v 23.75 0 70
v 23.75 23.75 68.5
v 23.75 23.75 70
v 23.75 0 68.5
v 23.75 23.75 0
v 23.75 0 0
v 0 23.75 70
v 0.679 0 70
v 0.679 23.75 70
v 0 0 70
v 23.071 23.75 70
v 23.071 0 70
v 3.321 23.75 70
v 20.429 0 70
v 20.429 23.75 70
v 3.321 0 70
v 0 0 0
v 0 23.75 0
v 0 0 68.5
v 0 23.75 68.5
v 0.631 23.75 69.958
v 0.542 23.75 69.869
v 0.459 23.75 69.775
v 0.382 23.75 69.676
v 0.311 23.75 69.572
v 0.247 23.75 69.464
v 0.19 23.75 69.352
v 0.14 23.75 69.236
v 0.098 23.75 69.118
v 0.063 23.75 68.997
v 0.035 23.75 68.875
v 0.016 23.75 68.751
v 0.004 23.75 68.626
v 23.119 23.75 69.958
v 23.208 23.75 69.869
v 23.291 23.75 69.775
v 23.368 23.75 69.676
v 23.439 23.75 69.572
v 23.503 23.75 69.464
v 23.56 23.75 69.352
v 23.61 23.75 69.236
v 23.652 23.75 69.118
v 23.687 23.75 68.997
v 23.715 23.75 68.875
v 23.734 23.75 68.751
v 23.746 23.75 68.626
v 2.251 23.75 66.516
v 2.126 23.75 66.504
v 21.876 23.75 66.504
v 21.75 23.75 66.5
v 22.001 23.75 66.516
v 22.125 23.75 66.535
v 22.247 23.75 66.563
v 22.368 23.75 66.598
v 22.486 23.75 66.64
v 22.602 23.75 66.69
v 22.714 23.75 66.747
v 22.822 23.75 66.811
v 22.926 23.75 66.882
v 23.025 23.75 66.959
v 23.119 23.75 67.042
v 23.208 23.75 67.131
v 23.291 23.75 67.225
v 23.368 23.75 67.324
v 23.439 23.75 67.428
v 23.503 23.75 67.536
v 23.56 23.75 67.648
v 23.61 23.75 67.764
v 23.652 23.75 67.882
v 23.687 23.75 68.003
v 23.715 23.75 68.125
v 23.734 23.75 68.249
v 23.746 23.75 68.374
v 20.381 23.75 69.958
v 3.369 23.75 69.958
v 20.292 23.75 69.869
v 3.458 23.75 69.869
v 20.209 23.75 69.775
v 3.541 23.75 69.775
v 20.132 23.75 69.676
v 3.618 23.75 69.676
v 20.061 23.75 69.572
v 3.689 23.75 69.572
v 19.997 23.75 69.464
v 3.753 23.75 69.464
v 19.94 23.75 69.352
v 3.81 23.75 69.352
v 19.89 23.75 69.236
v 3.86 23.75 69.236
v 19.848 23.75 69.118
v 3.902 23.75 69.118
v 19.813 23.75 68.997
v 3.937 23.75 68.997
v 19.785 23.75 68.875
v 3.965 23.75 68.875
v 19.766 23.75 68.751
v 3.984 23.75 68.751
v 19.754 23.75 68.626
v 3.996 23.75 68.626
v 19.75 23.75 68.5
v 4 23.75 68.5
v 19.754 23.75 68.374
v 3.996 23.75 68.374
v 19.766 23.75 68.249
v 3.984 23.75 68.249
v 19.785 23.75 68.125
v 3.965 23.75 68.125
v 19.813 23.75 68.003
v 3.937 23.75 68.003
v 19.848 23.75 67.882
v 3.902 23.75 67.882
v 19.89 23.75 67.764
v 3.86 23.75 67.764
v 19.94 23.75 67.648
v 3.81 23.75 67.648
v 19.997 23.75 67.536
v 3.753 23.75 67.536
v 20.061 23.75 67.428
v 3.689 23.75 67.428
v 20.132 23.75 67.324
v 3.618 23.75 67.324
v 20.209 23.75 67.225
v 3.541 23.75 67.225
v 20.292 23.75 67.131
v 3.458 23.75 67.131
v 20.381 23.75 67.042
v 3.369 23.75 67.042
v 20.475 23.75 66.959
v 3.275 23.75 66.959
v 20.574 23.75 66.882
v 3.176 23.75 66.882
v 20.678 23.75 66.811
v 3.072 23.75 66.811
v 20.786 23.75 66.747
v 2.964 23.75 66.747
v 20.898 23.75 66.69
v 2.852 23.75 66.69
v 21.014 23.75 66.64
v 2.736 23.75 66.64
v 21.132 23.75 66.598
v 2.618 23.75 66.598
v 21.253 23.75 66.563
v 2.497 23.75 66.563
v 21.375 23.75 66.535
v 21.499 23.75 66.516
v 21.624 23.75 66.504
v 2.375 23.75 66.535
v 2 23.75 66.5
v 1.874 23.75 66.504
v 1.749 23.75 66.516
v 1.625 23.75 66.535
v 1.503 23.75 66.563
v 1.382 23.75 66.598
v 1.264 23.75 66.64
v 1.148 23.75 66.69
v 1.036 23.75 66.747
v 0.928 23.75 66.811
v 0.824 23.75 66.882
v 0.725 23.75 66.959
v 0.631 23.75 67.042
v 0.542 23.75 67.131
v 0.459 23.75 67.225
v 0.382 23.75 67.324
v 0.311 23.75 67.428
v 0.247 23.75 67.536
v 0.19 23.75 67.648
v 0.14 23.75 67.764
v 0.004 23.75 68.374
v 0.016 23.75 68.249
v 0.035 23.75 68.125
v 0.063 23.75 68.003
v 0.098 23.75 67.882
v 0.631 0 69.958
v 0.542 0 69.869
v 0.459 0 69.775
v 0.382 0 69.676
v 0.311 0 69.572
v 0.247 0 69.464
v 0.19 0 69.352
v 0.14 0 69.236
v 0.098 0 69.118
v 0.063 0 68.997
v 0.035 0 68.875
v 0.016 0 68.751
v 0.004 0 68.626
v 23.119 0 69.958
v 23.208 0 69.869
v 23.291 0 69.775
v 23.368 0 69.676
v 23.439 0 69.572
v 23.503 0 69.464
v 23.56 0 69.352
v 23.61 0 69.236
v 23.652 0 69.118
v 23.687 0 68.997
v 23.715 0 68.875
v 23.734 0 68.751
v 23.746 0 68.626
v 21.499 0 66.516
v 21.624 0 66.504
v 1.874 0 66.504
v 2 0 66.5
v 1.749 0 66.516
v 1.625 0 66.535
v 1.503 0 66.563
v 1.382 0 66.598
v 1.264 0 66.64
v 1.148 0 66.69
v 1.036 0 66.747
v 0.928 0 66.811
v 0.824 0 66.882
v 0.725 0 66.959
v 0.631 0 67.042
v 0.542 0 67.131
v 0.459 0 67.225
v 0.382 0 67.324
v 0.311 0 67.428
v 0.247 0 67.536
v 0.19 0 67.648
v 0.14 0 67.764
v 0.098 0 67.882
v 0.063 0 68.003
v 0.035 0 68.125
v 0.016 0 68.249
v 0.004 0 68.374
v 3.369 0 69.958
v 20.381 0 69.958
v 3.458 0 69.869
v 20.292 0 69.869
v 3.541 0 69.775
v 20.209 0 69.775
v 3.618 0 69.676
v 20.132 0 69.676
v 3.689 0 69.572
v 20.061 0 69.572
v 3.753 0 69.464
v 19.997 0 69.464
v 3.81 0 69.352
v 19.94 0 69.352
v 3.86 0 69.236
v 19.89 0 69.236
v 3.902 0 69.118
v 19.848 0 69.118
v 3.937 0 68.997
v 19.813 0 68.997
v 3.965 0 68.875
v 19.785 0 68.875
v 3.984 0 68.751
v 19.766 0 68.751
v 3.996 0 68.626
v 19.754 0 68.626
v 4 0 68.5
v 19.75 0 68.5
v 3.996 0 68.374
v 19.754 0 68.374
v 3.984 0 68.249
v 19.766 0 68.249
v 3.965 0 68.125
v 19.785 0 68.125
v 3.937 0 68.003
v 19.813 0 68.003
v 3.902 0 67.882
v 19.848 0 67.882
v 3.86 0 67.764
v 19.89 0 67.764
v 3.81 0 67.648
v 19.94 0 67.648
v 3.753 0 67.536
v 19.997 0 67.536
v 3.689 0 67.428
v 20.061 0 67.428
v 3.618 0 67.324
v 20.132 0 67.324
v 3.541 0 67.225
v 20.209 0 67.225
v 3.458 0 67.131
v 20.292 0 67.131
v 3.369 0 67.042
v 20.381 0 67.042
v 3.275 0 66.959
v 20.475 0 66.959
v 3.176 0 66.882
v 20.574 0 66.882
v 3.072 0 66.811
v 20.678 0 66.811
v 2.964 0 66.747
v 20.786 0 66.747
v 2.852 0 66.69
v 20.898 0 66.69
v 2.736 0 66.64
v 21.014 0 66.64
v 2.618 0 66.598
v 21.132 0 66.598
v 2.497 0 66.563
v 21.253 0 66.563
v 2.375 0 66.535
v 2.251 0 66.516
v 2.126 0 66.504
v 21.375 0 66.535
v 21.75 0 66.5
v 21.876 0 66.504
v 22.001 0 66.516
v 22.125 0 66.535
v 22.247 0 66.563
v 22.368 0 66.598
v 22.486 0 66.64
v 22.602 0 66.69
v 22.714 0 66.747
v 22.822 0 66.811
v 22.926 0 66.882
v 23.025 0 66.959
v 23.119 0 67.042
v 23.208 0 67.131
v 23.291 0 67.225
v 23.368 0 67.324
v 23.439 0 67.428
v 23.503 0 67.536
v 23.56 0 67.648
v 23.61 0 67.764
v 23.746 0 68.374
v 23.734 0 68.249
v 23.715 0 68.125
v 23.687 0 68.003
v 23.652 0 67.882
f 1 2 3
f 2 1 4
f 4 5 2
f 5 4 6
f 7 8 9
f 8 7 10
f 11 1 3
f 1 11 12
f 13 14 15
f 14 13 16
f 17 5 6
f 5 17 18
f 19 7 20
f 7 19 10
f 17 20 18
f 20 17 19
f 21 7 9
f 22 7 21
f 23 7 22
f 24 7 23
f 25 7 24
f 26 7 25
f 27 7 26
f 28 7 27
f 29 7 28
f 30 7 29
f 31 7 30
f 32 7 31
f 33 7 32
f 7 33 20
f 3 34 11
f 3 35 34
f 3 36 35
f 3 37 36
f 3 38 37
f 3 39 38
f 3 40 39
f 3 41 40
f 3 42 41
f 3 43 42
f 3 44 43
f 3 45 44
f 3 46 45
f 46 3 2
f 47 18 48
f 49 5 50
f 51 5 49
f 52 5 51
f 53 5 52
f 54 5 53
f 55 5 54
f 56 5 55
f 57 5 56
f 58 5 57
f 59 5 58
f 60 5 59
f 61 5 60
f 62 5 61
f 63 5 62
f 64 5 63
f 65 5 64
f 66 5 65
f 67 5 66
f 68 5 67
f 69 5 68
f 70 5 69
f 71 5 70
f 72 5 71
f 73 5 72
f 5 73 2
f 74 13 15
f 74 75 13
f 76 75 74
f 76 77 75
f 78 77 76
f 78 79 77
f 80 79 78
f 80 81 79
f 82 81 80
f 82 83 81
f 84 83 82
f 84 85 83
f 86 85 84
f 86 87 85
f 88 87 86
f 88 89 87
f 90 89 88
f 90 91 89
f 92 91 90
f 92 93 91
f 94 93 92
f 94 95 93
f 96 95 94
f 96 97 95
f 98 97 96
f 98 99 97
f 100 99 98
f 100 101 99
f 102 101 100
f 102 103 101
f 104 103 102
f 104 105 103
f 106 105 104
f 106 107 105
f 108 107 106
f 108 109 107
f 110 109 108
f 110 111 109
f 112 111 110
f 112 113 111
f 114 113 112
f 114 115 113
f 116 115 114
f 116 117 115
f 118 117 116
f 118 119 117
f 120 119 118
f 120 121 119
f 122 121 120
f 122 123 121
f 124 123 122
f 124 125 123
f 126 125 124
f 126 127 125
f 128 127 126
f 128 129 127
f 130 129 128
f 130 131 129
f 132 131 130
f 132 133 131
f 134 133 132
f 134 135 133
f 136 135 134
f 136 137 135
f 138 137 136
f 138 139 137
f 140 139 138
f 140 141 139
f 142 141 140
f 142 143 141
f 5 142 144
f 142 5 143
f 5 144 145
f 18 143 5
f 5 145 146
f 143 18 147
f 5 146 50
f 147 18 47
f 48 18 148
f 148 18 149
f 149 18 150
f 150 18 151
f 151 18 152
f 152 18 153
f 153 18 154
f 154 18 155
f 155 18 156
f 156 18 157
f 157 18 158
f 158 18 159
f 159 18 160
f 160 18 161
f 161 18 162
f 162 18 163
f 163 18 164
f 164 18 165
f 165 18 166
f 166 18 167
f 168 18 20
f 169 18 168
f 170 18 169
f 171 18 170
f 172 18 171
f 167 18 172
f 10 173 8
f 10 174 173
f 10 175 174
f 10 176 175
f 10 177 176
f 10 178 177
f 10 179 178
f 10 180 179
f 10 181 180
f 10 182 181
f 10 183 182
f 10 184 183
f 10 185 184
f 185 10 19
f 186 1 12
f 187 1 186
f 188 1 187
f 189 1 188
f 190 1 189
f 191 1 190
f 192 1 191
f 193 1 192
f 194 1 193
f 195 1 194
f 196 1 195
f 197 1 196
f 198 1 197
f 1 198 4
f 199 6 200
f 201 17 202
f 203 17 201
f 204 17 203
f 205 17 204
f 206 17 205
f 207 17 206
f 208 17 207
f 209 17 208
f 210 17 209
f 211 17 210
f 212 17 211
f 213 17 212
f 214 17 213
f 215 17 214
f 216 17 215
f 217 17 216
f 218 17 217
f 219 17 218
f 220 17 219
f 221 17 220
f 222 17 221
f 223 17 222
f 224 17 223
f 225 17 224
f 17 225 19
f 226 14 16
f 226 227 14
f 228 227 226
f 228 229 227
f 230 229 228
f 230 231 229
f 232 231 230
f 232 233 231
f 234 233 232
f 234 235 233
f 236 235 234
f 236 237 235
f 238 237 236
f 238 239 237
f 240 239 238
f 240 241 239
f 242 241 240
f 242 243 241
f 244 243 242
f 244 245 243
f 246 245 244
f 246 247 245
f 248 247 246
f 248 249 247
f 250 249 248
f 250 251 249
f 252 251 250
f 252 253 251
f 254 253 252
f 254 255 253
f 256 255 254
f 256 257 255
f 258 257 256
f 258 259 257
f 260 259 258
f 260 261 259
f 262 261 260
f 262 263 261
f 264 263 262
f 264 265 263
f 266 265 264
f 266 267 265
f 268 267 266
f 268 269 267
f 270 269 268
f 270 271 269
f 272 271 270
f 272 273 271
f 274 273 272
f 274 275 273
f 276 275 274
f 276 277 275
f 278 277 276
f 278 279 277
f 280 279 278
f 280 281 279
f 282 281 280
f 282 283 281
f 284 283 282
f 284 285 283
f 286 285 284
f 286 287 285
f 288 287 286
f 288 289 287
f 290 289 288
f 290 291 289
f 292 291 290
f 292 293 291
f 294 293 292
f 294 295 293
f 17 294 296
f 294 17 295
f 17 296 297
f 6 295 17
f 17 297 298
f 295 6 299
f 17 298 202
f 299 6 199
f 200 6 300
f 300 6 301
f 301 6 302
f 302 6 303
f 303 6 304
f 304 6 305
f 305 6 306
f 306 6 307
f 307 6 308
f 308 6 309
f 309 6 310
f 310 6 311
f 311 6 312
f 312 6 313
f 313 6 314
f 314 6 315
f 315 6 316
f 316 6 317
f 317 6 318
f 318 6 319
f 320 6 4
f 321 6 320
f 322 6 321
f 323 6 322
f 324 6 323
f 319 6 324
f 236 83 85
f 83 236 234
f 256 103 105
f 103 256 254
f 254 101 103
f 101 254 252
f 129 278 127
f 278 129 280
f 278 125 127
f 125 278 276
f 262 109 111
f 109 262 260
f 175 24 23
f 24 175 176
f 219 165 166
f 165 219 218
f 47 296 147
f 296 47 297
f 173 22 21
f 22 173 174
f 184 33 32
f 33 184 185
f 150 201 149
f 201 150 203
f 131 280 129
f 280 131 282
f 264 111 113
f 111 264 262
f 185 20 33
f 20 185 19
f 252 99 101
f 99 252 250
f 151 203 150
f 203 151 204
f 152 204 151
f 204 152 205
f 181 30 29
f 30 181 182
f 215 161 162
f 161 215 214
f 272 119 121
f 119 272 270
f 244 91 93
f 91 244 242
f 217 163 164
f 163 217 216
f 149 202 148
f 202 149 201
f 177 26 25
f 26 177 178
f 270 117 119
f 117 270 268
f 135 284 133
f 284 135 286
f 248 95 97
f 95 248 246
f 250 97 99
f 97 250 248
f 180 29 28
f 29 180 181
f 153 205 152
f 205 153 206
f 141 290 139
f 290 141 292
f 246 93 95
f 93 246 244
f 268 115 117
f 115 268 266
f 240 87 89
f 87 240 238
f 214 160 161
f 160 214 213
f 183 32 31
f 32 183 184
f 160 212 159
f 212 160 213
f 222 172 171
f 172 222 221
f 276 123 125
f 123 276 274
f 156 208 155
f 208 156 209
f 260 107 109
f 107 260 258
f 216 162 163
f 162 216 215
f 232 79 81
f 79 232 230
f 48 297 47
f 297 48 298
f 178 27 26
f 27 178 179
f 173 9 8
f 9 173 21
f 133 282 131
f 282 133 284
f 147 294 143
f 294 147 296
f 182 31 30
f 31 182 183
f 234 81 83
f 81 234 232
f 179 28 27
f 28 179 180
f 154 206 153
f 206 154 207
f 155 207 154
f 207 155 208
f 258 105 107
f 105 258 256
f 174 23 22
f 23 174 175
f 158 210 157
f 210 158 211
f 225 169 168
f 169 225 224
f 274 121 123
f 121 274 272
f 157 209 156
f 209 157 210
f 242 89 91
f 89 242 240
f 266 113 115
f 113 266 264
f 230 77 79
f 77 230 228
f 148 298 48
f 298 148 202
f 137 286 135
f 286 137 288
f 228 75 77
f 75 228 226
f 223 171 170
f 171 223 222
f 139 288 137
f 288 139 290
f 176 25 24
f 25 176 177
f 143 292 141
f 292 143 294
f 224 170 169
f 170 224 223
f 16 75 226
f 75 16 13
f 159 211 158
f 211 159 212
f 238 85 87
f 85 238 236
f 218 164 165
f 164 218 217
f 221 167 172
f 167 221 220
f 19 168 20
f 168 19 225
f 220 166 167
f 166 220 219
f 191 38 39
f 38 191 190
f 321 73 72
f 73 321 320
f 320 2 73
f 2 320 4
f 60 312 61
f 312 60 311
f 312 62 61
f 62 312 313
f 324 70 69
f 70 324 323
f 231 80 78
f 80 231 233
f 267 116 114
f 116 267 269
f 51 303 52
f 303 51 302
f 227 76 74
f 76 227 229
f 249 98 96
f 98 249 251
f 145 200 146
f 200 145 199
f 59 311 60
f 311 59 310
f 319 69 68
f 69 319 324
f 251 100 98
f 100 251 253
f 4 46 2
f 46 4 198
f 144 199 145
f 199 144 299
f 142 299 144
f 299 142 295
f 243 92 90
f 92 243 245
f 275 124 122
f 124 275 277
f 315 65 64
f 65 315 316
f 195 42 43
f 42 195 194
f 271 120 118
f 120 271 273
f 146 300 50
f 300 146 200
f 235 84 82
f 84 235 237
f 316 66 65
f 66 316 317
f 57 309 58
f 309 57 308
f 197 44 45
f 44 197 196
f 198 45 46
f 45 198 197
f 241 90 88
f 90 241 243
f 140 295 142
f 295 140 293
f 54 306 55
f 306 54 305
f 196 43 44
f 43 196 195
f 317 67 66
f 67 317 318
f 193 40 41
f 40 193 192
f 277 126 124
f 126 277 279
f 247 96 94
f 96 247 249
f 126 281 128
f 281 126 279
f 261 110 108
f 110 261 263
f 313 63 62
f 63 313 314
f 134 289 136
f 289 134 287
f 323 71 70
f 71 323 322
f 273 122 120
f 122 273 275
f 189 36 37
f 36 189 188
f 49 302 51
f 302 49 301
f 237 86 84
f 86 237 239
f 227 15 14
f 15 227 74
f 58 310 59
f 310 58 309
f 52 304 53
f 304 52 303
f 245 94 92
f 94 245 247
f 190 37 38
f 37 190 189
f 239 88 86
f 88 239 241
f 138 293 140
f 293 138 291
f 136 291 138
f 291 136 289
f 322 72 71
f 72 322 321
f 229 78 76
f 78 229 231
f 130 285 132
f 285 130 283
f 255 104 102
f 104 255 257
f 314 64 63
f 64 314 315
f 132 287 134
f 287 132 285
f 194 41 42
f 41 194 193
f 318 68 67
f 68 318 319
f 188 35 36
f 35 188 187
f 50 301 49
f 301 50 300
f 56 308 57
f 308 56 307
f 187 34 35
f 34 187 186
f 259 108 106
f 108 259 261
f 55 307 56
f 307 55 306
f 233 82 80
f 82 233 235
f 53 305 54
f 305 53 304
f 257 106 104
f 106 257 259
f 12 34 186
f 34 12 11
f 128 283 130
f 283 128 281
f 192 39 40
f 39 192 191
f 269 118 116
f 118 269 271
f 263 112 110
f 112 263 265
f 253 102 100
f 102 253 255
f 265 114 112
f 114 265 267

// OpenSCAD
RodDiameter = 4.0;
RodSpacing =16.5;

PadLength = 23.75;
PadHeight = 70;


module trayLevelPad()
{
    color("blue")difference()
    {
        difference()
        {
        cube([PadLength,PadLength,PadHeight]);
        translate([radius(),yMove(),zMove(0.5)])
        rotate(a=[-90,0,0])
        cylinder($fn=100,barLength(), radius(), radius(), false);
        }
        translate([PadLength-radius(),yMove(),zMove(0.5)])
        rotate(a=[-90,0,0])
        cylinder($fn=100,barLength(), radius(), radius(), false);
    }
}

function zMove(x=0)=PadHeight-(RodDiameter/4)-x;
function yMove(x=0)=(x==0)? -1:x;
function radius(x=RodDiameter/2)= x;
function barLength(x=PadLength +2) = x;


trayLevelPad();
